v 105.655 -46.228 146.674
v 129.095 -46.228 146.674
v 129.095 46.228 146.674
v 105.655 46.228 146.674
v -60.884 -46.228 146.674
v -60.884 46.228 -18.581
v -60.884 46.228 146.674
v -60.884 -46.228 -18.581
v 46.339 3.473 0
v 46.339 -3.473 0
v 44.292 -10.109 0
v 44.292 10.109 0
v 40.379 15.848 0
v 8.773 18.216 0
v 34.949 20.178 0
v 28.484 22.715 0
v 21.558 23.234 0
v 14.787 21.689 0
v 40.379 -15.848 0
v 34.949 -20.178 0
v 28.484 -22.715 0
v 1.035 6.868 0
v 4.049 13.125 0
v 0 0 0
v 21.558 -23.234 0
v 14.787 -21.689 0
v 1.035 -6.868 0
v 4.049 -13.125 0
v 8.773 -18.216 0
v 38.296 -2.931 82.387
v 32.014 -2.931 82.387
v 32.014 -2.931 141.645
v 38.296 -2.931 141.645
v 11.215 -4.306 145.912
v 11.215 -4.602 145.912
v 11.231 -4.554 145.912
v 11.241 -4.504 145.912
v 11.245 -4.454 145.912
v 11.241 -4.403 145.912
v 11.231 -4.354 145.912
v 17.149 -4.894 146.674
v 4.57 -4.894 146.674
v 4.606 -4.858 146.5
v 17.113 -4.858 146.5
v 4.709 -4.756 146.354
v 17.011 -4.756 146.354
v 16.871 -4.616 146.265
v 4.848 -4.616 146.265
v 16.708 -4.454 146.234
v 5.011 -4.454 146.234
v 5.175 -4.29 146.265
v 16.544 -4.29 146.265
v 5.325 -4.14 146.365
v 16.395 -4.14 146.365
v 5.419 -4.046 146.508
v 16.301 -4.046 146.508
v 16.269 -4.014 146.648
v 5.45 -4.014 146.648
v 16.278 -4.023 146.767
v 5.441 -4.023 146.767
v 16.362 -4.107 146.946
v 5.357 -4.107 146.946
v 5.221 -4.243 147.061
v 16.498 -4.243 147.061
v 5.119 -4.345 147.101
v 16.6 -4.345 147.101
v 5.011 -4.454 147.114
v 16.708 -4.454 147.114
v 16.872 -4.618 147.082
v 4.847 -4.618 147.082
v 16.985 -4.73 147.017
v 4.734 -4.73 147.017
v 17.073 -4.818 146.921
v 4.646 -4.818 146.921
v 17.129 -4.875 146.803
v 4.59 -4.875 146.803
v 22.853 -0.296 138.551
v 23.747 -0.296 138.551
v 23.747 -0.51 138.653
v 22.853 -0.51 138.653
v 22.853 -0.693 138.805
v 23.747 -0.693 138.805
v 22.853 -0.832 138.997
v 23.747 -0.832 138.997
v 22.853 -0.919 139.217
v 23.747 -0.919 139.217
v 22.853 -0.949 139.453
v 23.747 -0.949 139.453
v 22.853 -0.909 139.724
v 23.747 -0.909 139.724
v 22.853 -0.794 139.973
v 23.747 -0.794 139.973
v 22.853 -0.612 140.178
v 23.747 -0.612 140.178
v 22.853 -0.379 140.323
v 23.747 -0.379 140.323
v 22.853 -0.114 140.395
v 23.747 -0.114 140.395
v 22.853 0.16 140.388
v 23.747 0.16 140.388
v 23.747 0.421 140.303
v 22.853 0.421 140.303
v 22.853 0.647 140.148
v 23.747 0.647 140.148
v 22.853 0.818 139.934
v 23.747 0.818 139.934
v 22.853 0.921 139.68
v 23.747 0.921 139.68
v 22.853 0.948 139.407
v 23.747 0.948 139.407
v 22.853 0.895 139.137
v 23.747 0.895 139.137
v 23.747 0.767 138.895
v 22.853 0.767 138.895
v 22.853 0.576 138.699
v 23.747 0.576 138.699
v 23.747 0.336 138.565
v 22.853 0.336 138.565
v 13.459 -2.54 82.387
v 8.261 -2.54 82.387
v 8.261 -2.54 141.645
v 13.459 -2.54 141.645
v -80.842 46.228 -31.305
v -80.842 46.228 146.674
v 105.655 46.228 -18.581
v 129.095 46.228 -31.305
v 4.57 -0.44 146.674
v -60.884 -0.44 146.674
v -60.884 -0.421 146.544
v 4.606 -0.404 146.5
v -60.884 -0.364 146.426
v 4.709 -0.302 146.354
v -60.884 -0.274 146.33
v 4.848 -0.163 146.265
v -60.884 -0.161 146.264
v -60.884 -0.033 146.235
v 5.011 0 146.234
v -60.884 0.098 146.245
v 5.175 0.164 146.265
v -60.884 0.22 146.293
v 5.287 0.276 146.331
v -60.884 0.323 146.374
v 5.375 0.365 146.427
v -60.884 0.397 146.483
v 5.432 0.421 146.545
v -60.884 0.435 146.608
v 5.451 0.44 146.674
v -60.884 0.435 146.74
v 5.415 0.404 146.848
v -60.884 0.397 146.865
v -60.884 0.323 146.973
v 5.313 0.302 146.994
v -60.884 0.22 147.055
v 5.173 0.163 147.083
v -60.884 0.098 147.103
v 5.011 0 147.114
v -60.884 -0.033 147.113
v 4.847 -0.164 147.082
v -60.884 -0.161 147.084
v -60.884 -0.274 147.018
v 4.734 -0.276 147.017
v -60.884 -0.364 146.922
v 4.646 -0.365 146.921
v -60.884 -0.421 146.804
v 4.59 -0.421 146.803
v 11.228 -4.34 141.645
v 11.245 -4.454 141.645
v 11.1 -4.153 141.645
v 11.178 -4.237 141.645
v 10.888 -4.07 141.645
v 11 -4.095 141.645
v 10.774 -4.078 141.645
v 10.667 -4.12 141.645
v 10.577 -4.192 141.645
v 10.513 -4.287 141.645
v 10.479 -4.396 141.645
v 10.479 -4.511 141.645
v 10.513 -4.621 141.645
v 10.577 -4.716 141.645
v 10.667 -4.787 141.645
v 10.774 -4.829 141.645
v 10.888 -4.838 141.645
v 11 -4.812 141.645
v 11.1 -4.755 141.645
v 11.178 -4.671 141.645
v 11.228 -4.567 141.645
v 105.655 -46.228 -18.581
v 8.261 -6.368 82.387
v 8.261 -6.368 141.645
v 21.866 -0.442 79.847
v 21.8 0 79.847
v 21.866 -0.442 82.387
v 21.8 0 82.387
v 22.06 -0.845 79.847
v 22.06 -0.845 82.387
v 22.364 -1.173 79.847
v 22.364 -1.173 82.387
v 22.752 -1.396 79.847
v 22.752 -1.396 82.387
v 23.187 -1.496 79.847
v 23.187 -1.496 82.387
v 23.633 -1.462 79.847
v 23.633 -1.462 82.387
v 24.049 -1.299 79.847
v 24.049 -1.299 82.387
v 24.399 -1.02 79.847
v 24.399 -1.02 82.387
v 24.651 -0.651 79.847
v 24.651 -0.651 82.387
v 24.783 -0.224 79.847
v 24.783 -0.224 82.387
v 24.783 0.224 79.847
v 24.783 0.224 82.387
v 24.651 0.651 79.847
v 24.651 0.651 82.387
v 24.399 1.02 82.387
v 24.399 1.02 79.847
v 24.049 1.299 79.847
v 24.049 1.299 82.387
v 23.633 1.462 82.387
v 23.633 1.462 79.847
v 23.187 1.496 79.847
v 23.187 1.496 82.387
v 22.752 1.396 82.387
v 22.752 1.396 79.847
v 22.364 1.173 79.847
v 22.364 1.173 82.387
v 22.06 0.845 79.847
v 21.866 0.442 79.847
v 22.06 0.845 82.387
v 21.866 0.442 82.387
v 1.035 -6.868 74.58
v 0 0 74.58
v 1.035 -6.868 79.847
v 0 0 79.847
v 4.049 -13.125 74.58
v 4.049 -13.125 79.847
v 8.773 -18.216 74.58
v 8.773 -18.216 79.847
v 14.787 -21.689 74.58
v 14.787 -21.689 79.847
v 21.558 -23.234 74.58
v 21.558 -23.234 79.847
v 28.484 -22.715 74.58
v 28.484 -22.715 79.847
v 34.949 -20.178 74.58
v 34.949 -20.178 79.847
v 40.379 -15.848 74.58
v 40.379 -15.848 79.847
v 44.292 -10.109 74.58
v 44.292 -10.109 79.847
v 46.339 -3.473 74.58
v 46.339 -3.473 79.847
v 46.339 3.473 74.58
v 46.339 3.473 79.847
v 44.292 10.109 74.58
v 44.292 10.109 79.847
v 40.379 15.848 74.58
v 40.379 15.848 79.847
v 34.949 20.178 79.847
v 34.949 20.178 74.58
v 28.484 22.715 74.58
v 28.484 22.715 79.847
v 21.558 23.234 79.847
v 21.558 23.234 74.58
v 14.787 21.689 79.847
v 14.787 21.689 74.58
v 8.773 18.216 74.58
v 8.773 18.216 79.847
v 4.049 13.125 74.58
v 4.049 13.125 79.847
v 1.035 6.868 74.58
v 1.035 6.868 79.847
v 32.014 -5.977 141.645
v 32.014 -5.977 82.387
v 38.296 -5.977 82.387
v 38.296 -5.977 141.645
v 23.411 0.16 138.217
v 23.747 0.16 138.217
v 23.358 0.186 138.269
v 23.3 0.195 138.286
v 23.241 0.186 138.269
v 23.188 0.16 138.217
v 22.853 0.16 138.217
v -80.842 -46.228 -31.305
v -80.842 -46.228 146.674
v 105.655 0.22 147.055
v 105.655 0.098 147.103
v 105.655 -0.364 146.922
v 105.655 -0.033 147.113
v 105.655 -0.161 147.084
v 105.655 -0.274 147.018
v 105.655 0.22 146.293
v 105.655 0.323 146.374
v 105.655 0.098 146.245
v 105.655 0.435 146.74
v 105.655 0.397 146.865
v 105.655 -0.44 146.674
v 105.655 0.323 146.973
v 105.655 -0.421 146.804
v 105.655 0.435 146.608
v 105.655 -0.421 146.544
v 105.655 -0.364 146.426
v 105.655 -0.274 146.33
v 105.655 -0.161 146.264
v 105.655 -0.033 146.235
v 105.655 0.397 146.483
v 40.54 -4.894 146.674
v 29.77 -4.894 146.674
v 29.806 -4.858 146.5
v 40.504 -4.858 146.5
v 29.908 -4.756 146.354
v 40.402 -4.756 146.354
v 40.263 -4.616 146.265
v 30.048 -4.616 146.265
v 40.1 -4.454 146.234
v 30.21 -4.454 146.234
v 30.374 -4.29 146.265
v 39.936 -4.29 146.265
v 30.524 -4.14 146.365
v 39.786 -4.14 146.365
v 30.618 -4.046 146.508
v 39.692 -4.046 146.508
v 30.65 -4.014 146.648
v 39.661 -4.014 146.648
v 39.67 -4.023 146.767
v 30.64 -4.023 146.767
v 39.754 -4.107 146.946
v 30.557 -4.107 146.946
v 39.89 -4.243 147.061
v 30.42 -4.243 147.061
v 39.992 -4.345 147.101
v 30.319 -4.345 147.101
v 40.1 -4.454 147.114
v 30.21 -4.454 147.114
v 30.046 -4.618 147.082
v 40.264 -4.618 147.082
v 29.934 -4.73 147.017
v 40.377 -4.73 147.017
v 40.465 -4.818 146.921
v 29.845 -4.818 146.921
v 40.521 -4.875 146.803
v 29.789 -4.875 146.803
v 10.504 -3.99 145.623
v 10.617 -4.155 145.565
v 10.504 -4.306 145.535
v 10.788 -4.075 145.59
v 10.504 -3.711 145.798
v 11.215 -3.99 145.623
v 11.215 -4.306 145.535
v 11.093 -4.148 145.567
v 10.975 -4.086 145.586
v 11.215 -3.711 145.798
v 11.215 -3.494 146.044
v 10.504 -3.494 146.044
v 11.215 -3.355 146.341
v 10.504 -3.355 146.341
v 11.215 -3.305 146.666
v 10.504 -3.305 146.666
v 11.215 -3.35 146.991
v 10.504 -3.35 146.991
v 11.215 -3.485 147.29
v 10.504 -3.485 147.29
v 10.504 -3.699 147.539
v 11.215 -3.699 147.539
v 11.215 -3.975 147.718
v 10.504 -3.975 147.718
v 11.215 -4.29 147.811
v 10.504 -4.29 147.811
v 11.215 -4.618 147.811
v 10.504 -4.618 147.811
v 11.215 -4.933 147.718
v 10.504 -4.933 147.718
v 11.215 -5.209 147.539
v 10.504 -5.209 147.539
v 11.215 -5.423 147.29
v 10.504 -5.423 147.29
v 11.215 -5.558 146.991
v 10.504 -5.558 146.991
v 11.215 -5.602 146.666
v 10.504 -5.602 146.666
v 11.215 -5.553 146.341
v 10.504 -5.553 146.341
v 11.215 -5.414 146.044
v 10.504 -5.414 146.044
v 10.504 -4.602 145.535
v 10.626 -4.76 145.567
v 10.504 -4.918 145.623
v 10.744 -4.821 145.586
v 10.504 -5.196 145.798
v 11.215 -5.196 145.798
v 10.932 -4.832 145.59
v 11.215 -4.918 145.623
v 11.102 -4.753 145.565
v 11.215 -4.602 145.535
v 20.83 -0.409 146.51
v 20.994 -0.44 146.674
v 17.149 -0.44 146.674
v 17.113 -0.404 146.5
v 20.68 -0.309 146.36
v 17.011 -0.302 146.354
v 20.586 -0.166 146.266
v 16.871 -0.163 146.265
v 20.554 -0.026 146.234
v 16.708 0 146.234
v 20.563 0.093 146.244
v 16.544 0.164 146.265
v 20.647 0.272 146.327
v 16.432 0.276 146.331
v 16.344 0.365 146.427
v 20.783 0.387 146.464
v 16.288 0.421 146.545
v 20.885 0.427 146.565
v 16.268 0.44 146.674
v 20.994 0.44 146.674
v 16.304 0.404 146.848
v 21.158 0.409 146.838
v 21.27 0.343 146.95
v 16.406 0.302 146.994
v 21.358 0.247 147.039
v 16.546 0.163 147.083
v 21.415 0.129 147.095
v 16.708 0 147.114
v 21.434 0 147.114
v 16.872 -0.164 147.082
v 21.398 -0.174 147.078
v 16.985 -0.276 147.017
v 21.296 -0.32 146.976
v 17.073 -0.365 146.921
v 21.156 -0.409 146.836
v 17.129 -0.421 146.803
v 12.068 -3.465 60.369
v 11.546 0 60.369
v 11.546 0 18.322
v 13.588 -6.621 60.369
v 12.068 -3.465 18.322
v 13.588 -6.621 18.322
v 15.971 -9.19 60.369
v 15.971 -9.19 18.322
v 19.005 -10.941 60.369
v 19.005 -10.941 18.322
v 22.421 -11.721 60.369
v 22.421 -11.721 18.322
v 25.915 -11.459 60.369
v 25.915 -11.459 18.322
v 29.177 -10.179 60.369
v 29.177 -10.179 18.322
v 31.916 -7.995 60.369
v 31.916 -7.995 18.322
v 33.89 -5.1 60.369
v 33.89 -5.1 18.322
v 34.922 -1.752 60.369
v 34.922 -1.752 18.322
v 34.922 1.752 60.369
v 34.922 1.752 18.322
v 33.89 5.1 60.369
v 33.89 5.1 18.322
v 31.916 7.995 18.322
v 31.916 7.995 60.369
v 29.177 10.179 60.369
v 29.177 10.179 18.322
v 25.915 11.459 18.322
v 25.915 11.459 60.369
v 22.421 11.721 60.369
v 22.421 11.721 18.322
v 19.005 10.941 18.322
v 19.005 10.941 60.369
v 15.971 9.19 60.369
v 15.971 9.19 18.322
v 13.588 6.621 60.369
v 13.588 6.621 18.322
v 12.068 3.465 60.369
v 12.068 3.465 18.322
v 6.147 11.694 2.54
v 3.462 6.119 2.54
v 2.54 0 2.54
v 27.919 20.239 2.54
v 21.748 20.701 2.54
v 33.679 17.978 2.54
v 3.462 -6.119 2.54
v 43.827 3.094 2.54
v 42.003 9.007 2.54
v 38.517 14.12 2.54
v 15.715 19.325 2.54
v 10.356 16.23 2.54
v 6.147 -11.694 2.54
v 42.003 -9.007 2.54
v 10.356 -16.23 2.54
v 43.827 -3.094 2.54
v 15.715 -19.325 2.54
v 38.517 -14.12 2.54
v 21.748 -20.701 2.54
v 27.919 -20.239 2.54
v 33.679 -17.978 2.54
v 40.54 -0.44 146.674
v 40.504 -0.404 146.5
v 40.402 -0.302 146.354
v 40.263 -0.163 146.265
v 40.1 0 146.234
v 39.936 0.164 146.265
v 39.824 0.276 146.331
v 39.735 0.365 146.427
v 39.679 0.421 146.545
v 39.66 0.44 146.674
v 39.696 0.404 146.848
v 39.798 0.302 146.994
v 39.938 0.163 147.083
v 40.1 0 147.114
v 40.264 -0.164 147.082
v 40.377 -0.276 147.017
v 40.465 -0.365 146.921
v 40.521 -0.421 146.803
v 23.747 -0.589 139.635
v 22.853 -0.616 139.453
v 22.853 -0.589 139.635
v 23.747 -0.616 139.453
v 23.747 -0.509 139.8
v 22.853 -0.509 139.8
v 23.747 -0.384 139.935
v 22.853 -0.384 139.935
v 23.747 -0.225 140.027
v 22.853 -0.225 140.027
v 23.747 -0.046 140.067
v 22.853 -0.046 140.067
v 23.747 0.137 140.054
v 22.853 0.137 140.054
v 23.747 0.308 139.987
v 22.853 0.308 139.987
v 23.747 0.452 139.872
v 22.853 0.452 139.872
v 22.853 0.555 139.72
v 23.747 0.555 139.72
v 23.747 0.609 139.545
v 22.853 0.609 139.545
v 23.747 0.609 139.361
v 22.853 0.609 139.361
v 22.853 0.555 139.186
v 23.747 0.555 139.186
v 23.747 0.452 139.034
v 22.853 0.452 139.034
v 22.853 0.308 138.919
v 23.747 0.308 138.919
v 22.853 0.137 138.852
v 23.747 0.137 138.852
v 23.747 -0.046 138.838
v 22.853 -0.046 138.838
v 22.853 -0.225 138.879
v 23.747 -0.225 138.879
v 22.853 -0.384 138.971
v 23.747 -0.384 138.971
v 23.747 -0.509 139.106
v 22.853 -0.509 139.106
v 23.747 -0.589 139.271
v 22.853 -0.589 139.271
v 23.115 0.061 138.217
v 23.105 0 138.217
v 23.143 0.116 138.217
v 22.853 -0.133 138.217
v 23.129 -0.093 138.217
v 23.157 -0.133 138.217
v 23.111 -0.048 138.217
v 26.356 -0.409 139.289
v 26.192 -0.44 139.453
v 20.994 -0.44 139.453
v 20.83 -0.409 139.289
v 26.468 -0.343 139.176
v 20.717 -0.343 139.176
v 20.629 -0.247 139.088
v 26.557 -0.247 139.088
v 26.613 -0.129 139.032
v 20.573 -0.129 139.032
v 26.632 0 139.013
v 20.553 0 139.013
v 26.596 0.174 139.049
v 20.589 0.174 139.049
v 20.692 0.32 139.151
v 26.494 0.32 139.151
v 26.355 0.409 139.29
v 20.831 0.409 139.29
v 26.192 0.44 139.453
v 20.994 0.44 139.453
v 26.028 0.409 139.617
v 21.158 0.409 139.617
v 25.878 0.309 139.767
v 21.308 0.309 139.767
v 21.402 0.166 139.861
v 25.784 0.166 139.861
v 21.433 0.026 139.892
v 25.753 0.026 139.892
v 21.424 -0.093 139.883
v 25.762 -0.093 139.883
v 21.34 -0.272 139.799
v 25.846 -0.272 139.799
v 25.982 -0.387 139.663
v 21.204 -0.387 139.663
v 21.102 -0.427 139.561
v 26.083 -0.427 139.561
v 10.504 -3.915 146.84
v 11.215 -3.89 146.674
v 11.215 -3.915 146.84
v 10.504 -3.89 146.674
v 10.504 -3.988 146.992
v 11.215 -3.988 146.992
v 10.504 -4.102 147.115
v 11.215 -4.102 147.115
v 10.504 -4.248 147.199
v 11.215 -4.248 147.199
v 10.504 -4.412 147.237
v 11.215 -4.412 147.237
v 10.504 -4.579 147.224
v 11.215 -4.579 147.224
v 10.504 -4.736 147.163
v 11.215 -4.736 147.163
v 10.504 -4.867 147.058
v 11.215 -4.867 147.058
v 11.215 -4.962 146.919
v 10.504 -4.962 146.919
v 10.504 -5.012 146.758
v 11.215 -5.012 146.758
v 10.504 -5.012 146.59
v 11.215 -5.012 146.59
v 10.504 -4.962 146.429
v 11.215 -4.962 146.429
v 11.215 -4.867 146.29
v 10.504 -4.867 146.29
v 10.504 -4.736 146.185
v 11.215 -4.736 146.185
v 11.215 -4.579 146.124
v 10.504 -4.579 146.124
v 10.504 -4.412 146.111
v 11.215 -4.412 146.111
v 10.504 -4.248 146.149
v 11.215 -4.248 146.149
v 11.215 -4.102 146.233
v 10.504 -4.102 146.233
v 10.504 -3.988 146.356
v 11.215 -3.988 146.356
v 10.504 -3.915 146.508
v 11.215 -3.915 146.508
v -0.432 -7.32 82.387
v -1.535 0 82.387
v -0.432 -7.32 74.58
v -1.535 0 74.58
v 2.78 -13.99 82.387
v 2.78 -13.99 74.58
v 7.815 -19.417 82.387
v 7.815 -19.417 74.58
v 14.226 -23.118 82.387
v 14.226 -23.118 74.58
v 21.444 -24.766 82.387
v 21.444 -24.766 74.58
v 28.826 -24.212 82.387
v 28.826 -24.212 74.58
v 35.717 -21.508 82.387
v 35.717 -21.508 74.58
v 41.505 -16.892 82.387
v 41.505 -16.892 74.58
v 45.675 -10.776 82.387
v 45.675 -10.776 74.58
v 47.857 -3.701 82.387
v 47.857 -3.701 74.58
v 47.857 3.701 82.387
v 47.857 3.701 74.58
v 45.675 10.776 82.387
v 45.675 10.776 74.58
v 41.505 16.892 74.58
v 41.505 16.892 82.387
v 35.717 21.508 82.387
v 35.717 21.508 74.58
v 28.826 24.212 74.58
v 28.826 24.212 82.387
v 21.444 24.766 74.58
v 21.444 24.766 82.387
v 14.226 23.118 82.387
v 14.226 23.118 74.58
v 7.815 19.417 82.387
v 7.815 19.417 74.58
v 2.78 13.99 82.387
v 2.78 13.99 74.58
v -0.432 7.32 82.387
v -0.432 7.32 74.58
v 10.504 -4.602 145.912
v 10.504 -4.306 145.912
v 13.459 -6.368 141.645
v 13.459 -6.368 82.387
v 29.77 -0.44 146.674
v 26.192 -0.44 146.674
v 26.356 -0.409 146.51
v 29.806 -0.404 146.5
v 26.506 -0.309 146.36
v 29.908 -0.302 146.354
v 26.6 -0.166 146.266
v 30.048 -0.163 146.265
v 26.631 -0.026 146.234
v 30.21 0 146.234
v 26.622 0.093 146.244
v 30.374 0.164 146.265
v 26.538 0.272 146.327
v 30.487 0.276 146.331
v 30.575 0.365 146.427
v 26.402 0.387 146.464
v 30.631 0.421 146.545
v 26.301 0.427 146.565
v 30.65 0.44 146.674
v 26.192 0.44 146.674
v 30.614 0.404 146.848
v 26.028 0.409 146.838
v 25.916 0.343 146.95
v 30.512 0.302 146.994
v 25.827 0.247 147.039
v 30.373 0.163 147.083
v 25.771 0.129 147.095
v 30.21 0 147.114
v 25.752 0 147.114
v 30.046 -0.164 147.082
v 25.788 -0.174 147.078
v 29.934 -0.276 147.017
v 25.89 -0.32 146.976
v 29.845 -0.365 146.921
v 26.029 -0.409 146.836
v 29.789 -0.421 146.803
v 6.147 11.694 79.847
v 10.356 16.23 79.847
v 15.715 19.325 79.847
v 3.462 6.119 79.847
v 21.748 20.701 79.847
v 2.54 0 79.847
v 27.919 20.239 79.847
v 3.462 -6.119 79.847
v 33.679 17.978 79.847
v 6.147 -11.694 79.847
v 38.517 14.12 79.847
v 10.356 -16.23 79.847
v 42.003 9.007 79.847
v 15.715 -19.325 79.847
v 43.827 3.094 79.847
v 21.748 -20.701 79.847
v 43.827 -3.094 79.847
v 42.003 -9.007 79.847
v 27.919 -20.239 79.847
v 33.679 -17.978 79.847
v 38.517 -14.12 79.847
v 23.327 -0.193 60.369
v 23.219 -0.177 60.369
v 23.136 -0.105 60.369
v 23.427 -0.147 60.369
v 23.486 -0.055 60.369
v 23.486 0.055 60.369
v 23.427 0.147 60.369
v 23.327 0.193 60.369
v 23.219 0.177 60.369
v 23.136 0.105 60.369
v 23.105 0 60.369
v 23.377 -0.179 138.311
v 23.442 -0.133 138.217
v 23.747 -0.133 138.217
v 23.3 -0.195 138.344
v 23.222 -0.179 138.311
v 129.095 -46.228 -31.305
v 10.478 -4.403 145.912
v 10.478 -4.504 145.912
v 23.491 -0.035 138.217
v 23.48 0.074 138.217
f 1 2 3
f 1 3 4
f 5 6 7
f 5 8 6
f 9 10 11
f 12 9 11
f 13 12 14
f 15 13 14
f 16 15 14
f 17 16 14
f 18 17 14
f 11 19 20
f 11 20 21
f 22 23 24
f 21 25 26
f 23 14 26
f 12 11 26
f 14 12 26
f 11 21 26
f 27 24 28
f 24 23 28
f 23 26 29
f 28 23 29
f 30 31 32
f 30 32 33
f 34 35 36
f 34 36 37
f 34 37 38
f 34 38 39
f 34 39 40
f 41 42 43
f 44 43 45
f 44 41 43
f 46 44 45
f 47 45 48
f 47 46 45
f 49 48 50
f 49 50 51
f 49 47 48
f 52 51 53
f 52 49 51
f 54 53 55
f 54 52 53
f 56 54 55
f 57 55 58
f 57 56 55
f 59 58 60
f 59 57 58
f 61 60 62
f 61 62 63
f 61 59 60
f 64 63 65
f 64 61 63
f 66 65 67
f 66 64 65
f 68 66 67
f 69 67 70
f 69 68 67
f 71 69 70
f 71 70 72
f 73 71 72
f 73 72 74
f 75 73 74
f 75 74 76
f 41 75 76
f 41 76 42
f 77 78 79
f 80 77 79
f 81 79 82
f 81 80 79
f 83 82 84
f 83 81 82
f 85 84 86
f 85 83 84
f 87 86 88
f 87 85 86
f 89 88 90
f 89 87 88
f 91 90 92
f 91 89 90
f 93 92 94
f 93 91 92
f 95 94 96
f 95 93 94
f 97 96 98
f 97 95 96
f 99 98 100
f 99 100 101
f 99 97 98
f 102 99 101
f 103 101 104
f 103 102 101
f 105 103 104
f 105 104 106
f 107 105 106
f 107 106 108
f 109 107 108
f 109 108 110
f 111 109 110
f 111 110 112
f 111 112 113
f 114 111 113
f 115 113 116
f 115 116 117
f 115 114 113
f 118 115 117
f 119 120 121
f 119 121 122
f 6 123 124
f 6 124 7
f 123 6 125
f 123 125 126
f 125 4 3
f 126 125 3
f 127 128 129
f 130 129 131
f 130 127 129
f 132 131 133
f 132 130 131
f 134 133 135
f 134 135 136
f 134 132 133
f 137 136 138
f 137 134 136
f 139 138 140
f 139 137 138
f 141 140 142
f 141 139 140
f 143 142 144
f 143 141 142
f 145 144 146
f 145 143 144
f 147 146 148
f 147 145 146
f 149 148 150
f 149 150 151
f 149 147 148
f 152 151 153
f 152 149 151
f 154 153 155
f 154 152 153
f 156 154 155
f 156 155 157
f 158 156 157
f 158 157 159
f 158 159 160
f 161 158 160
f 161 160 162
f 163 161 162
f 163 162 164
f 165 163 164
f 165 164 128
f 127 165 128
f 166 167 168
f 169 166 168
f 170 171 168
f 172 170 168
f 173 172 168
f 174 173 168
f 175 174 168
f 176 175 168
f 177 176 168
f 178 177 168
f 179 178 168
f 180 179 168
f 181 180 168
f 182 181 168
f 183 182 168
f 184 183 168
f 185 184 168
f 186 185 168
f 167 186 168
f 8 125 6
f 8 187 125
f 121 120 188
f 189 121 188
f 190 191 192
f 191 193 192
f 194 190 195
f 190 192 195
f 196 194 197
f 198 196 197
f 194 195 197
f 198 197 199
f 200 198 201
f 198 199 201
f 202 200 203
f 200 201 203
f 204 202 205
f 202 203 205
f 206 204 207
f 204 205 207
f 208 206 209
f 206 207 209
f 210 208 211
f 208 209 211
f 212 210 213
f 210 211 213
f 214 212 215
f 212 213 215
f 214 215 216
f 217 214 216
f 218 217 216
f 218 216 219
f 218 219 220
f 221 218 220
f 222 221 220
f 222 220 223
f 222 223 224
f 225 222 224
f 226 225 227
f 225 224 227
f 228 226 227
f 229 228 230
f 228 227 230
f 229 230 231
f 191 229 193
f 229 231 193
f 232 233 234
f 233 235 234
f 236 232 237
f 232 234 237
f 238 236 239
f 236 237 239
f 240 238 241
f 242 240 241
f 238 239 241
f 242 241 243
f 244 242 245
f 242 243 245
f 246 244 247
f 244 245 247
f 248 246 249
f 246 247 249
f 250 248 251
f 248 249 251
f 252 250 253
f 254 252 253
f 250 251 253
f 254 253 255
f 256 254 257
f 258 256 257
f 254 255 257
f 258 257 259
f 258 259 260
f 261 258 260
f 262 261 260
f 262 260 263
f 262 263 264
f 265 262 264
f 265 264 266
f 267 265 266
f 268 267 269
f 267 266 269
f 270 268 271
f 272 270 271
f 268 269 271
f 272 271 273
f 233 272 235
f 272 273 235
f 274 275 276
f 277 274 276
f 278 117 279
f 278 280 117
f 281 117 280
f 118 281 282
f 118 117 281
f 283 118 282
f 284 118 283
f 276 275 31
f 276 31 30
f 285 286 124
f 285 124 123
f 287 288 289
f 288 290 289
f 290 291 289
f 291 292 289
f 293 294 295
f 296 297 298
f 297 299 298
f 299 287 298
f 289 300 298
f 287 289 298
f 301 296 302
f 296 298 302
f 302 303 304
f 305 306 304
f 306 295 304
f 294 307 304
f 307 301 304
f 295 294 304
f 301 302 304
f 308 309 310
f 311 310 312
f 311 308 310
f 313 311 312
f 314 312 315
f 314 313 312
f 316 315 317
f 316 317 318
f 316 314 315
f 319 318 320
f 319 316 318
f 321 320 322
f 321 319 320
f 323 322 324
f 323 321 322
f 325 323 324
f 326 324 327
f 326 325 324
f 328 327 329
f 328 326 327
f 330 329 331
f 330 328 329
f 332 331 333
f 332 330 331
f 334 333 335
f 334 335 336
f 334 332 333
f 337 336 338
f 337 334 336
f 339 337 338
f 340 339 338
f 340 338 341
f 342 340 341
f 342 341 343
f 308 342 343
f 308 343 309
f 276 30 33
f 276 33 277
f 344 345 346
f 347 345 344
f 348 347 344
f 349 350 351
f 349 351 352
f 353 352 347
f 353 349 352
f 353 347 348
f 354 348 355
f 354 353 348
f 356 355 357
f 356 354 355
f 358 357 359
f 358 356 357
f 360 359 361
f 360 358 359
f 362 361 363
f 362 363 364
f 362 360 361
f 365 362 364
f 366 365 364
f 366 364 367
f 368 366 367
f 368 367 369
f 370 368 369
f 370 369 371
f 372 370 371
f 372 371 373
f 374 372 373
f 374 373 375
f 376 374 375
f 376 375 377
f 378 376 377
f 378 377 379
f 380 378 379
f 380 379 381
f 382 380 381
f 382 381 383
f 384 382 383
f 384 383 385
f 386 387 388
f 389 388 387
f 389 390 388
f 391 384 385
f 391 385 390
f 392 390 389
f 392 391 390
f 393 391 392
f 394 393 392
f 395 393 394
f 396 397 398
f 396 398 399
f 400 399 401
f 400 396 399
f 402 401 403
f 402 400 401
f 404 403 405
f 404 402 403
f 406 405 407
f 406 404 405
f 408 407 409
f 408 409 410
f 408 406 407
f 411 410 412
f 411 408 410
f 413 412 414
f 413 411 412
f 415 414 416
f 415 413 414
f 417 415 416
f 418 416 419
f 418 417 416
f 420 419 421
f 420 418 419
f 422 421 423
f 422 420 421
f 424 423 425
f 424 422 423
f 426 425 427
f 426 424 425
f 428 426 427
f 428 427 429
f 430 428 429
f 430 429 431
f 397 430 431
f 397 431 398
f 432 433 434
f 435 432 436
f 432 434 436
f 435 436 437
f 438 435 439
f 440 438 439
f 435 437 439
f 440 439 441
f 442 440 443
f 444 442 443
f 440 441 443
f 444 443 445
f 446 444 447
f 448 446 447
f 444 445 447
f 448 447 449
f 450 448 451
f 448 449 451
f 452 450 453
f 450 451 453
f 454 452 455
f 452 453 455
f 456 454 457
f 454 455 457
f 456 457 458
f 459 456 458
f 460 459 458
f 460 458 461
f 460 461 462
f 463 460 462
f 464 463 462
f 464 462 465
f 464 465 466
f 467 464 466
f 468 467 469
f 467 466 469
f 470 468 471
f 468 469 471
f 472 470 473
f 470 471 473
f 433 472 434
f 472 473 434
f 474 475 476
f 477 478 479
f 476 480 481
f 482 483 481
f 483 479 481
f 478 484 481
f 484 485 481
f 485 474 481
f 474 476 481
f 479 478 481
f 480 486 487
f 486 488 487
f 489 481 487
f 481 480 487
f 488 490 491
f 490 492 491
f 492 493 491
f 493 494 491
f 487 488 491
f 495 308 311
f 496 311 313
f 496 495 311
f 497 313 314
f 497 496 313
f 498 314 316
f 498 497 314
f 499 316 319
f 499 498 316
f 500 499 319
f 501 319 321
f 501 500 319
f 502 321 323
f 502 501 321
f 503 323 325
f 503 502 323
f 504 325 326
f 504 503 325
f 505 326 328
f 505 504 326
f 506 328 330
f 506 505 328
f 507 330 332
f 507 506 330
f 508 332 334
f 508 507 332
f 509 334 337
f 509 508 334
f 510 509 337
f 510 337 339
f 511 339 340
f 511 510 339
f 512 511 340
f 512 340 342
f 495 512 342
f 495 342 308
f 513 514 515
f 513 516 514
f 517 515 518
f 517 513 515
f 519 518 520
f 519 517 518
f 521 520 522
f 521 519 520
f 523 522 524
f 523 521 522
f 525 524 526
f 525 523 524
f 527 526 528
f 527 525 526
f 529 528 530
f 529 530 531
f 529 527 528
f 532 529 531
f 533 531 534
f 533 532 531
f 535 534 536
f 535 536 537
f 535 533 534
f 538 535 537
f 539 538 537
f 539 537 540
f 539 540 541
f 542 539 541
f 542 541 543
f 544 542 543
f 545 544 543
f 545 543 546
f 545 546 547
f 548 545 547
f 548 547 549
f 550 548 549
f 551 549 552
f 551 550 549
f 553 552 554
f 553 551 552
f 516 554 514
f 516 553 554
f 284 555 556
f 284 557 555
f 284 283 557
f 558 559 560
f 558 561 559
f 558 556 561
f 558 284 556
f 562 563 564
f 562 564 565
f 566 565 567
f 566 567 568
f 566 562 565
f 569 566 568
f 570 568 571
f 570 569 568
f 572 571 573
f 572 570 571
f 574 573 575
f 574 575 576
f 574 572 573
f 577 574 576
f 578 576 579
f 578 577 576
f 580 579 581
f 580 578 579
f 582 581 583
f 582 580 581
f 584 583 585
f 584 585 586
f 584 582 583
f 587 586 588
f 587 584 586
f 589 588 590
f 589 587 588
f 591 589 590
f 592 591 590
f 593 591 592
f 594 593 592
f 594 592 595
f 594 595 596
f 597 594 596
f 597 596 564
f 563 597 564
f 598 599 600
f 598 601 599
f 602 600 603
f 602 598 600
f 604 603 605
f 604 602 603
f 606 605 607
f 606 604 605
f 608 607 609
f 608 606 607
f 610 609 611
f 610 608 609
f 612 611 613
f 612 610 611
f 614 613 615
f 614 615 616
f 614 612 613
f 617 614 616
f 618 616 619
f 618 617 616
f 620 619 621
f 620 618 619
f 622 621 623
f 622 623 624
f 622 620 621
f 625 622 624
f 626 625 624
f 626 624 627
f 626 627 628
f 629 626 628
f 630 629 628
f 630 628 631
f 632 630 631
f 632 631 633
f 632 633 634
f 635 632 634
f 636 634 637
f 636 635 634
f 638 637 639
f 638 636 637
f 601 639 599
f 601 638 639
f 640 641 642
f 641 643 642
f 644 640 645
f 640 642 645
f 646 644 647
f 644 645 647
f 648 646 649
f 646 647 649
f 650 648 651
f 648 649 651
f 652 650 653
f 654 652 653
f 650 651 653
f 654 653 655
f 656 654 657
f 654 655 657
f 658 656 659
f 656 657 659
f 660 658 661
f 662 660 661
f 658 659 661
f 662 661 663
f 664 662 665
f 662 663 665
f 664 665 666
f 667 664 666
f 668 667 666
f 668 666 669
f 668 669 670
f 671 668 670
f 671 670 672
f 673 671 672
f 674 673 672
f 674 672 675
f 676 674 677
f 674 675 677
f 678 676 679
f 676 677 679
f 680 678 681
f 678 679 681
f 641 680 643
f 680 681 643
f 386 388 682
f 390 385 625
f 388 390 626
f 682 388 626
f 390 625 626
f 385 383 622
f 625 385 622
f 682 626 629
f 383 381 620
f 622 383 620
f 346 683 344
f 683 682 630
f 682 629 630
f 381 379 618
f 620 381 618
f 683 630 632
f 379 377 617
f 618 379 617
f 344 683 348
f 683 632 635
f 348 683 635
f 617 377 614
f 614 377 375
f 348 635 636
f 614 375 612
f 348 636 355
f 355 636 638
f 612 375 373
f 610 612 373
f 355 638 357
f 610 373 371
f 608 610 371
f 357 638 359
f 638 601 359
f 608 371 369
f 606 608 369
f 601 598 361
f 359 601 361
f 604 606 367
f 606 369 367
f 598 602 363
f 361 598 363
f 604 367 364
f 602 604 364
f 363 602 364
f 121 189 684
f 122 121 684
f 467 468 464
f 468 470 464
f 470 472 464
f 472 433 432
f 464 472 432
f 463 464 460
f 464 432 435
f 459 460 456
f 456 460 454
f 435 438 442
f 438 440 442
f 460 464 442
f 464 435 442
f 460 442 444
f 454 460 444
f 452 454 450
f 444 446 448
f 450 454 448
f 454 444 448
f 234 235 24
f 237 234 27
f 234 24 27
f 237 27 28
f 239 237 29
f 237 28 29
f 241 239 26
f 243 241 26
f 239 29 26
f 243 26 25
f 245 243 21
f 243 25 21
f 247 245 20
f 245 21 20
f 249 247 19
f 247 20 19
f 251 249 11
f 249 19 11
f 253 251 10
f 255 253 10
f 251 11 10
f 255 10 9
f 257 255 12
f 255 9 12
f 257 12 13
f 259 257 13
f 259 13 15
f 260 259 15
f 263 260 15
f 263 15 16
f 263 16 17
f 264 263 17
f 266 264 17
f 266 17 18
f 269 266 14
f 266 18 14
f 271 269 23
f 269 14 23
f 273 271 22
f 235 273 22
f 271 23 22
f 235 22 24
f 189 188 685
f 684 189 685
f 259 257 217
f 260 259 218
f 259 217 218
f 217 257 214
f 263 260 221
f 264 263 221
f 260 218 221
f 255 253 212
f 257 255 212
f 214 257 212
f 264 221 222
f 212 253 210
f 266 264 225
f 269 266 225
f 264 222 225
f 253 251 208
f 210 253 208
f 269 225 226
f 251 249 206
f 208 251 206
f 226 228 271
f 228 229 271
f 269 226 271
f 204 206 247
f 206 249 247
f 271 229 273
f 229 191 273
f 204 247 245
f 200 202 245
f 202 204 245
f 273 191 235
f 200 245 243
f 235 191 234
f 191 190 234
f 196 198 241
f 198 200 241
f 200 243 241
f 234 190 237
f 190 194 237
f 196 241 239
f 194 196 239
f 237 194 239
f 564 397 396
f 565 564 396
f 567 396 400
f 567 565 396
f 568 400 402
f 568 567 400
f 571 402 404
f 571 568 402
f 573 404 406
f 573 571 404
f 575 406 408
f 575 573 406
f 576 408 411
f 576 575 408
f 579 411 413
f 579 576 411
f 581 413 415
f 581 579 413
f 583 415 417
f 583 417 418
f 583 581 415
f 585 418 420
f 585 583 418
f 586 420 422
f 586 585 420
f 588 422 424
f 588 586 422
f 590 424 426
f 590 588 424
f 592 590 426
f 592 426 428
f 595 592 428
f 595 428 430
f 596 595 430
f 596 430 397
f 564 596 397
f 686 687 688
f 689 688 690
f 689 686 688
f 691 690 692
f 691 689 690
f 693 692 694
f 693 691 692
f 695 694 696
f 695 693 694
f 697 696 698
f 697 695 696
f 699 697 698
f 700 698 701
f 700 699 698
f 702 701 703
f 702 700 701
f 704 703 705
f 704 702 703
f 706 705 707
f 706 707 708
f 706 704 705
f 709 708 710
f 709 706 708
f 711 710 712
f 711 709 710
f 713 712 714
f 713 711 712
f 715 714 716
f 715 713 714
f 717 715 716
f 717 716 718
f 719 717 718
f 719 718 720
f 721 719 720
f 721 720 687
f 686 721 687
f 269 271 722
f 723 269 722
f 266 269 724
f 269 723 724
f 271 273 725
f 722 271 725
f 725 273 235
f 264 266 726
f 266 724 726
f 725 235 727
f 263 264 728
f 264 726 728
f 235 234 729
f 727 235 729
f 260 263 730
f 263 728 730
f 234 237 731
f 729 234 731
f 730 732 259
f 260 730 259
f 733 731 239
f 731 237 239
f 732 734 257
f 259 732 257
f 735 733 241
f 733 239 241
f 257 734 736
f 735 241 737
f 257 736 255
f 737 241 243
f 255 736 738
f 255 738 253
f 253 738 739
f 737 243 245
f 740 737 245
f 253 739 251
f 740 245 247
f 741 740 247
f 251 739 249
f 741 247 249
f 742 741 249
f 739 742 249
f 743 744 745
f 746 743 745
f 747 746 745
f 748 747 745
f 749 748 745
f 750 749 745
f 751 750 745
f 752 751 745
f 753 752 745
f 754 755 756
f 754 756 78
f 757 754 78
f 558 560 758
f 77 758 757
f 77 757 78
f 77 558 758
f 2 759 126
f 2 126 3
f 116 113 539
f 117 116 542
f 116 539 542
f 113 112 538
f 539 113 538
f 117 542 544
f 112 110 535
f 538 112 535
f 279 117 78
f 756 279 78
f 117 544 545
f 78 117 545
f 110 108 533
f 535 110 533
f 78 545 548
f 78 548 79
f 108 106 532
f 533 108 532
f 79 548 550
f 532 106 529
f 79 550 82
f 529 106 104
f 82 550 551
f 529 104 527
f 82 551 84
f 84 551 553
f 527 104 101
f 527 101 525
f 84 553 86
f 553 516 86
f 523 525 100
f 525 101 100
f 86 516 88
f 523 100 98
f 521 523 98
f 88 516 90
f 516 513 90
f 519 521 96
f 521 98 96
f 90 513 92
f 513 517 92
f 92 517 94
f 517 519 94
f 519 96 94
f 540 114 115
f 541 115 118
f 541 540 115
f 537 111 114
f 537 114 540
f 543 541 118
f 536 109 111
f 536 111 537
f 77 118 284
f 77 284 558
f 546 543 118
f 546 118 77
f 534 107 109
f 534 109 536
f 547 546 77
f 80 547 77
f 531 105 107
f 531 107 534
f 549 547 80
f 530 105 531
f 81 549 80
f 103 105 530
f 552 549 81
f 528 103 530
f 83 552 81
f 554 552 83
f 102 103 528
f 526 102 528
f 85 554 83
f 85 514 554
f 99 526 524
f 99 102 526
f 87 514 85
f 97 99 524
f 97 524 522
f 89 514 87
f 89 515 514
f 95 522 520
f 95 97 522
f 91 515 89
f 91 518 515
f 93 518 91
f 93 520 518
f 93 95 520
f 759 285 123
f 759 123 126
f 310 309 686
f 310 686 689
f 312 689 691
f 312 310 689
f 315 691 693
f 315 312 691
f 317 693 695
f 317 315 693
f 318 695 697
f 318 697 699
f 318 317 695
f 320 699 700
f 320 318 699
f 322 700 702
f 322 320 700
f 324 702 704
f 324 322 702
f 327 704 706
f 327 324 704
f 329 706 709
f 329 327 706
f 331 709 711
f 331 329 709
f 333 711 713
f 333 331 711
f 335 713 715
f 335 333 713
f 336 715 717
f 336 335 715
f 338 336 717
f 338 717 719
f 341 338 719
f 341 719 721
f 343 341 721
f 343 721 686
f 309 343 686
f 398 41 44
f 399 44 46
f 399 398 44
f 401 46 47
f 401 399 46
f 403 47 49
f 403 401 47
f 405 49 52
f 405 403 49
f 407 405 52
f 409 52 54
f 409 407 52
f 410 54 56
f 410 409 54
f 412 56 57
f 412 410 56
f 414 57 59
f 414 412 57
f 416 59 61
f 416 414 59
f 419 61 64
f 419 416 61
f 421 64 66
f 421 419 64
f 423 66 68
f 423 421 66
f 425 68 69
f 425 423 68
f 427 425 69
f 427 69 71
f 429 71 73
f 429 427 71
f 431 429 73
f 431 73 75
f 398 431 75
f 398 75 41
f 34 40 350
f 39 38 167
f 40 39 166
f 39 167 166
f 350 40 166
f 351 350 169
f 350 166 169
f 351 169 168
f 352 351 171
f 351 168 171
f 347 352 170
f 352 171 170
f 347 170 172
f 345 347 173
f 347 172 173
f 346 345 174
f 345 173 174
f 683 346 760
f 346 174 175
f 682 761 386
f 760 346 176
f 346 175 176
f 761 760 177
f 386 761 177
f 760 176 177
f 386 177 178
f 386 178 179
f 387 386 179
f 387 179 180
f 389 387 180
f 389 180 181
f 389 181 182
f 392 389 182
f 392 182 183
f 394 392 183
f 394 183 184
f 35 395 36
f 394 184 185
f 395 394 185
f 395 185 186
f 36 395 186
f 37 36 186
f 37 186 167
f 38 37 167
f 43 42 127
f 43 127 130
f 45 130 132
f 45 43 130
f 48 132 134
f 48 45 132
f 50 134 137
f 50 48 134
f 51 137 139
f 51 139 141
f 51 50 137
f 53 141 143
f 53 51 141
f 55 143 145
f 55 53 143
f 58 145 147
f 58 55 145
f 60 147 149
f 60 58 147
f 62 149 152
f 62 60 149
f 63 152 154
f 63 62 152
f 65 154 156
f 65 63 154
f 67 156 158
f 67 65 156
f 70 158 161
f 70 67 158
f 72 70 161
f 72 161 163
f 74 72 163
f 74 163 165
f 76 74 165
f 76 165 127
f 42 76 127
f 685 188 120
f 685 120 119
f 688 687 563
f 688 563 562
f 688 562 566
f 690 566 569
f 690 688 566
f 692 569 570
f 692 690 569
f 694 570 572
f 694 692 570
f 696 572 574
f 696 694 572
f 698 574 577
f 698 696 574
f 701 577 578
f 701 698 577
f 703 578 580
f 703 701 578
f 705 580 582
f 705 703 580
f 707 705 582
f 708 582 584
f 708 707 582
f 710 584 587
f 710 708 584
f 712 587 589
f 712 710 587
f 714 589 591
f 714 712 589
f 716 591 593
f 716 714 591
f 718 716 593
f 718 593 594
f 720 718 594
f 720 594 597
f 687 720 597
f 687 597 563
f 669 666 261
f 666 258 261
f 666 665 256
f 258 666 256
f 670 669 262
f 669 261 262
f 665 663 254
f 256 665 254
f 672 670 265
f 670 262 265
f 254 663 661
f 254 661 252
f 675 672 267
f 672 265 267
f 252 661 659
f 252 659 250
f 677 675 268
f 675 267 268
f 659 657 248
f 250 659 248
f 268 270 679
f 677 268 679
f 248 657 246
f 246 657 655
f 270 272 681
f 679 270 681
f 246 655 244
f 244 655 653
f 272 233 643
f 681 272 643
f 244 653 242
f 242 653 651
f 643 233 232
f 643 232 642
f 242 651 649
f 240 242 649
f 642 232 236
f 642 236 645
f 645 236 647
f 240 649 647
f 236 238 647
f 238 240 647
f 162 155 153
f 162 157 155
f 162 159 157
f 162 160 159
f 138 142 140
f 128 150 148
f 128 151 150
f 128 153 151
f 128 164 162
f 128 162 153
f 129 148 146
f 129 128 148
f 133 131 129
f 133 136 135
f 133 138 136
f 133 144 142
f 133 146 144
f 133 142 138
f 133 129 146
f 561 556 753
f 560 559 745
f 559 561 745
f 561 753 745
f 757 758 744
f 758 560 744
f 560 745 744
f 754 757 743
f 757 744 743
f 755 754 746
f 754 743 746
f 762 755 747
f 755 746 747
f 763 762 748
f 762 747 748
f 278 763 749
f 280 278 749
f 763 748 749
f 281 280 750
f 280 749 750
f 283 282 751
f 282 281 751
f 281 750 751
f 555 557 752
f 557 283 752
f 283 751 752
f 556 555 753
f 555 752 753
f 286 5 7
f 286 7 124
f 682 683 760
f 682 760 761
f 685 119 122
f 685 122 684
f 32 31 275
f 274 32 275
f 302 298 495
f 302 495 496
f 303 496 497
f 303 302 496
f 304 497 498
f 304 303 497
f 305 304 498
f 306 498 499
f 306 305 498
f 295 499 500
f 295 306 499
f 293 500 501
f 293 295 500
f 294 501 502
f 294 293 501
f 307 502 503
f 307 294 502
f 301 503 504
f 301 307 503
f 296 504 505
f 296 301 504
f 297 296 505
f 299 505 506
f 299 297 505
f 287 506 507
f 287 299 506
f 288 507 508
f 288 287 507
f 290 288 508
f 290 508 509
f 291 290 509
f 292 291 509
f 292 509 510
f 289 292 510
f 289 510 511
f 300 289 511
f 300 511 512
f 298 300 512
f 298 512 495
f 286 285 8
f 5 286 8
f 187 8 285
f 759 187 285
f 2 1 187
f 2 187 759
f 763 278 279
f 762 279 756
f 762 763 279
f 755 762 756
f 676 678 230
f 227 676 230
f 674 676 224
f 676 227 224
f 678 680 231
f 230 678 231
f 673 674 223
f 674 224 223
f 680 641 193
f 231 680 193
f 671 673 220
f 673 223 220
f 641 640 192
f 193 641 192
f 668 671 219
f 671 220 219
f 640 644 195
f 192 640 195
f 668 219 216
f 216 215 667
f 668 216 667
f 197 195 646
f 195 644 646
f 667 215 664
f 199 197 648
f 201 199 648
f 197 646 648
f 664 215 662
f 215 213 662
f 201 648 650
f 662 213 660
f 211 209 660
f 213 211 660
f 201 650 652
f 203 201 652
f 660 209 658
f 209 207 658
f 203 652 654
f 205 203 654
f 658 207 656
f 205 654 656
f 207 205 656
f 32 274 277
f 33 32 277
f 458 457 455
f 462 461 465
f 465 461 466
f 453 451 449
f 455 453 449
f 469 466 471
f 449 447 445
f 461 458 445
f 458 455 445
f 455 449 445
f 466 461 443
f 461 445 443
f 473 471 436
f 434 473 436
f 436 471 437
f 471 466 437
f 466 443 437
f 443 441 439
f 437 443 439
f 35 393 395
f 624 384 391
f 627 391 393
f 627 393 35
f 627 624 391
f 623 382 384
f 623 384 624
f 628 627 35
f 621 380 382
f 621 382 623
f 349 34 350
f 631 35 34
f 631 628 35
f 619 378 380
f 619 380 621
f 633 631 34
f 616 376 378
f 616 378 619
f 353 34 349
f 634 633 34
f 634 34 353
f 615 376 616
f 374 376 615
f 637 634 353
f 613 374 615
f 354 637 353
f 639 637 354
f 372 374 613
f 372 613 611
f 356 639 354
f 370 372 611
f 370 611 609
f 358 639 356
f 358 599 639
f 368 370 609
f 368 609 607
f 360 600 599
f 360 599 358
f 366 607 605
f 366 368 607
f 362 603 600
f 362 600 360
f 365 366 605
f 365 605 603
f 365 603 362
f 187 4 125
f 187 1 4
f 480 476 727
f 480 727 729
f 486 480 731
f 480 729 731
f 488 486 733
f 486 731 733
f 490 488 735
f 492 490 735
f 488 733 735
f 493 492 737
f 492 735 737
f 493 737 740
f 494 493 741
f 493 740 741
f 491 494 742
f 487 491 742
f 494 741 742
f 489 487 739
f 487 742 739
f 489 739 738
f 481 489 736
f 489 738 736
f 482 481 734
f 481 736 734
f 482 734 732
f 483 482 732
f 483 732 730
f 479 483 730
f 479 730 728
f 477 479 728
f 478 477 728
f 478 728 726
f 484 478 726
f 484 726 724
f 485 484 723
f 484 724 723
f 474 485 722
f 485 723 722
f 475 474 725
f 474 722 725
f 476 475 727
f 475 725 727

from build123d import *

# Parameters (mm, degrees)
F0_W      = 0.1947950749
F0_H      = 56.1171844602
F0_H_2    = 2.54
F0_H_3    = 19.478252266
F4_R      = 0.4402455132
F11_W     = 5.1980465651
F11_H     = 3.8275388069
F12_DEPTH = 59.2582
F11_W_2   = 6.2818654567
F11_H_2   = 3.045688549
F14_R     = 0.6162294101
F15_DEPTH = 0.44704
F18_R     = 1.1483963801
F18_R_2   = 0.5641964146
F19_DEPTH = 0.3556
F20_R     = 0.3851252417
F21_DEPTH = 4.2672
F22_DEPTH = 46.228


with BuildPart() as f5:
    # F0 (on Front) → F5 (revolve)
    with BuildSketch(Plane.XZ):
        Polygon((0, 74.58024472), (0, 0), (23.299543187, 0), (23.299543187, 2.54), (2.54, 2.54), (2.54, 79.8467842555), (0, 79.8467842555), align=None)
    revolve(axis=Axis((23.299543187, 0, 69.2519843578), (0, 0, 1)))


with BuildPart() as f6:
    # F0 (on Front) → F6 (revolve)
    with BuildSketch(Plane.XZ):
        Polygon((-1.5354988864, 74.58024472), (0, 74.58024472), (0, 79.8467842555), (2.54, 79.8467842555), (21.7997170985, 79.8467842555), (21.7997170985, 82.3867842555), (-1.5354988864, 82.3867842555), align=None)
    revolve(axis=Axis((23.299543187, 0, 69.2519843578), (0, 0, 1)))


with BuildPart() as f7:
    # F0 (on Front) → F7 (revolve)
    with BuildSketch(Plane.XZ):
        Polygon((11.545549036, 18.32194035), (23.299543187, 18.32194035), (23.299543187, 60.3685319895), (23.1047481121, 60.3685319895), (11.545549036, 60.3685319895), align=None)
    revolve(axis=Axis((23.299543187, 0, 69.2519843578), (0, 0, 1)))


with BuildPart() as f8:
    # F0 (on Front) → F8 (revolve)
    with BuildSketch(Plane.XZ):
        with Locations((23.2021456496, 110.4453764856)):
            Rectangle(F0_W, F0_H)
        with Locations((23.2021456496, 81.1167842555)):
            Rectangle(F0_W, F0_H_2)
        with Locations((23.2021456496, 70.1076581225)):
            Rectangle(F0_W, F0_H_3)
    revolve(axis=Axis((23.299543187, 0, 69.2519843578), (0, 0, 1)))

    # F14 (on line) → F15 (join, symmetric)
    with BuildSketch(Plane(origin=(23.299543187, 0, 0), x_dir=(0, -1, 0), z_dir=(-1, 0, 0))):
        with BuildLine():
            ThreePointArc((0.2958931431, 138.5512784378), (0.7685494681, 138.8962742348), (0.9489694498, 139.4529381654))
            ThreePointArc((0.9489694498, 139.4529381654), (-0.5393416407, 140.2337413488), (-0.3359056562, 138.5654076551))
            ThreePointArc((-0.3359056562, 138.5654076551), (-0.0212169507, 138.5042059284), (0.2958931431, 138.5512784378))
        make_face()
        with Locations((0, 139.4529381654)):
            Circle(F14_R, mode=Mode.SUBTRACT)
        with BuildLine():
            ThreePointArc((0.2958931431, 138.5512784378), (-0.0212169507, 138.5042059284), (-0.3359056562, 138.5654076551))
            Line((-0.3359056562, 138.5654076551), (-0.1596877119, 138.2169872522))
            Line((-0.1596877119, 138.2169872522), (0.1326351194, 138.2169872522))
            Line((0.1326351194, 138.2169872522), (0.2958931431, 138.5512784378))
        make_face()
    extrude(amount=F15_DEPTH, both=True)


with BuildPart() as f9:
    # F9: sweep along a path in F2, F0, F2
    with BuildLine(Plane.XY.offset(146.6739177704)) as f9_path:
        Line((-60.8838684857, 0), (5.0106160343, 0))
        Line((5.0106160343, 0), (5.0106160343, -4.4537703507))
        Line((5.0106160343, -4.4537703507), (16.7084876448, -4.4537703507))
        Line((16.7084876448, -4.4537703507), (16.7084876448, 0))
    with BuildLine(Plane.XZ) as f9_path_2:
        Line((16.7084876448, 146.6739177704), (20.9937285455, 146.6739177704))
        Line((20.9937285455, 146.6739177704), (20.9937285455, 139.4529381654))
        Line((20.9937285455, 139.4529381654), (23.299543187, 139.4529381654))
        Line((23.299543187, 139.4529381654), (26.1920172544, 139.4529381654))
        Line((26.1920172544, 139.4529381654), (26.1920172544, 146.6739177704))
        Line((26.1920172544, 146.6739177704), (30.210101977, 146.6739177704))
    with BuildLine(Plane.XY.offset(146.6739177704)) as f9_path_3:
        Line((30.210101977, 0), (30.210101977, -4.4537703507))
        Line((30.210101977, -4.4537703507), (40.1001647115, -4.4537703507))
        Line((40.1001647115, -4.4537703507), (40.1001647115, 0))
        Line((40.1001647115, 0), (105.6554988027, 0))
    # F4 (on line) → F9 (sweep)
    with BuildSketch(Plane(origin=(-60.8838684857, 0, 0), x_dir=(0, -1, 0), z_dir=(-1, 0, 0))):
        with Locations((0, 146.6739177704)):
            Circle(F4_R)
    sweep(path=f9_path.line + f9_path_2.line + f9_path_3.line, transition=Transition.RIGHT)


with BuildPart() as f12:
    # F11 (on line) → F12 (new body)
    with BuildSketch(Plane(origin=(0, 0, 82.3867842555), x_dir=(1, 0, 0), z_dir=(0, 0, -1))):
        with Locations((10.8595518395, 4.4537703507)):
            Rectangle(F11_W, F11_H)
    extrude(amount=-F12_DEPTH)


with BuildPart() as f12b:
    # F11 (on line) → F12, piece 2 (new body)
    with BuildSketch(Plane(origin=(0, 0, 82.3867842555), x_dir=(1, 0, 0), z_dir=(0, 0, -1))):
        with Locations((35.1551333442, 4.4537703507)):
            Rectangle(F11_W_2, F11_H_2)
    extrude(amount=-F12_DEPTH)


with BuildPart() as f19:
    # F18 (on line) → F19 (new body, symmetric)
    with BuildSketch(Plane.YZ.offset(10.8595518395)):
        with Locations((-4.4537703507, 146.6739177704)):
            Circle(F18_R)
        with Locations((-4.4537703507, 146.6739177704)):
            Circle(F18_R_2, mode=Mode.SUBTRACT)
    extrude(amount=F19_DEPTH, both=True)

    # F20 (on face) → F21 (join)
    with BuildSketch(Plane.XY.offset(141.6449842555)):
        with Locations((10.8595518395, -4.4537703507)):
            Circle(F20_R)
    extrude(amount=F21_DEPTH)


with BuildPart() as f22:
    # F0 (on Front) → F22 (new body, symmetric)
    with BuildSketch(Plane.XZ):
        Polygon((-60.8838684857, -18.5810942203), (-60.8838684857, 146.6739177704), (-80.8416977525, 146.6739177704), (-80.8416977525, -31.3054174185), (129.0952712297, -31.3054174185), (129.0952712297, 146.6739177704), (105.6554988027, 146.6739177704), (105.6554988027, -18.5810942203), align=None)
    extrude(amount=F22_DEPTH, both=True)


solid = Compound([f5.part, f6.part, f7.part, f8.part, f9.part, f12.part, f12b.part, f19.part, f22.part])
